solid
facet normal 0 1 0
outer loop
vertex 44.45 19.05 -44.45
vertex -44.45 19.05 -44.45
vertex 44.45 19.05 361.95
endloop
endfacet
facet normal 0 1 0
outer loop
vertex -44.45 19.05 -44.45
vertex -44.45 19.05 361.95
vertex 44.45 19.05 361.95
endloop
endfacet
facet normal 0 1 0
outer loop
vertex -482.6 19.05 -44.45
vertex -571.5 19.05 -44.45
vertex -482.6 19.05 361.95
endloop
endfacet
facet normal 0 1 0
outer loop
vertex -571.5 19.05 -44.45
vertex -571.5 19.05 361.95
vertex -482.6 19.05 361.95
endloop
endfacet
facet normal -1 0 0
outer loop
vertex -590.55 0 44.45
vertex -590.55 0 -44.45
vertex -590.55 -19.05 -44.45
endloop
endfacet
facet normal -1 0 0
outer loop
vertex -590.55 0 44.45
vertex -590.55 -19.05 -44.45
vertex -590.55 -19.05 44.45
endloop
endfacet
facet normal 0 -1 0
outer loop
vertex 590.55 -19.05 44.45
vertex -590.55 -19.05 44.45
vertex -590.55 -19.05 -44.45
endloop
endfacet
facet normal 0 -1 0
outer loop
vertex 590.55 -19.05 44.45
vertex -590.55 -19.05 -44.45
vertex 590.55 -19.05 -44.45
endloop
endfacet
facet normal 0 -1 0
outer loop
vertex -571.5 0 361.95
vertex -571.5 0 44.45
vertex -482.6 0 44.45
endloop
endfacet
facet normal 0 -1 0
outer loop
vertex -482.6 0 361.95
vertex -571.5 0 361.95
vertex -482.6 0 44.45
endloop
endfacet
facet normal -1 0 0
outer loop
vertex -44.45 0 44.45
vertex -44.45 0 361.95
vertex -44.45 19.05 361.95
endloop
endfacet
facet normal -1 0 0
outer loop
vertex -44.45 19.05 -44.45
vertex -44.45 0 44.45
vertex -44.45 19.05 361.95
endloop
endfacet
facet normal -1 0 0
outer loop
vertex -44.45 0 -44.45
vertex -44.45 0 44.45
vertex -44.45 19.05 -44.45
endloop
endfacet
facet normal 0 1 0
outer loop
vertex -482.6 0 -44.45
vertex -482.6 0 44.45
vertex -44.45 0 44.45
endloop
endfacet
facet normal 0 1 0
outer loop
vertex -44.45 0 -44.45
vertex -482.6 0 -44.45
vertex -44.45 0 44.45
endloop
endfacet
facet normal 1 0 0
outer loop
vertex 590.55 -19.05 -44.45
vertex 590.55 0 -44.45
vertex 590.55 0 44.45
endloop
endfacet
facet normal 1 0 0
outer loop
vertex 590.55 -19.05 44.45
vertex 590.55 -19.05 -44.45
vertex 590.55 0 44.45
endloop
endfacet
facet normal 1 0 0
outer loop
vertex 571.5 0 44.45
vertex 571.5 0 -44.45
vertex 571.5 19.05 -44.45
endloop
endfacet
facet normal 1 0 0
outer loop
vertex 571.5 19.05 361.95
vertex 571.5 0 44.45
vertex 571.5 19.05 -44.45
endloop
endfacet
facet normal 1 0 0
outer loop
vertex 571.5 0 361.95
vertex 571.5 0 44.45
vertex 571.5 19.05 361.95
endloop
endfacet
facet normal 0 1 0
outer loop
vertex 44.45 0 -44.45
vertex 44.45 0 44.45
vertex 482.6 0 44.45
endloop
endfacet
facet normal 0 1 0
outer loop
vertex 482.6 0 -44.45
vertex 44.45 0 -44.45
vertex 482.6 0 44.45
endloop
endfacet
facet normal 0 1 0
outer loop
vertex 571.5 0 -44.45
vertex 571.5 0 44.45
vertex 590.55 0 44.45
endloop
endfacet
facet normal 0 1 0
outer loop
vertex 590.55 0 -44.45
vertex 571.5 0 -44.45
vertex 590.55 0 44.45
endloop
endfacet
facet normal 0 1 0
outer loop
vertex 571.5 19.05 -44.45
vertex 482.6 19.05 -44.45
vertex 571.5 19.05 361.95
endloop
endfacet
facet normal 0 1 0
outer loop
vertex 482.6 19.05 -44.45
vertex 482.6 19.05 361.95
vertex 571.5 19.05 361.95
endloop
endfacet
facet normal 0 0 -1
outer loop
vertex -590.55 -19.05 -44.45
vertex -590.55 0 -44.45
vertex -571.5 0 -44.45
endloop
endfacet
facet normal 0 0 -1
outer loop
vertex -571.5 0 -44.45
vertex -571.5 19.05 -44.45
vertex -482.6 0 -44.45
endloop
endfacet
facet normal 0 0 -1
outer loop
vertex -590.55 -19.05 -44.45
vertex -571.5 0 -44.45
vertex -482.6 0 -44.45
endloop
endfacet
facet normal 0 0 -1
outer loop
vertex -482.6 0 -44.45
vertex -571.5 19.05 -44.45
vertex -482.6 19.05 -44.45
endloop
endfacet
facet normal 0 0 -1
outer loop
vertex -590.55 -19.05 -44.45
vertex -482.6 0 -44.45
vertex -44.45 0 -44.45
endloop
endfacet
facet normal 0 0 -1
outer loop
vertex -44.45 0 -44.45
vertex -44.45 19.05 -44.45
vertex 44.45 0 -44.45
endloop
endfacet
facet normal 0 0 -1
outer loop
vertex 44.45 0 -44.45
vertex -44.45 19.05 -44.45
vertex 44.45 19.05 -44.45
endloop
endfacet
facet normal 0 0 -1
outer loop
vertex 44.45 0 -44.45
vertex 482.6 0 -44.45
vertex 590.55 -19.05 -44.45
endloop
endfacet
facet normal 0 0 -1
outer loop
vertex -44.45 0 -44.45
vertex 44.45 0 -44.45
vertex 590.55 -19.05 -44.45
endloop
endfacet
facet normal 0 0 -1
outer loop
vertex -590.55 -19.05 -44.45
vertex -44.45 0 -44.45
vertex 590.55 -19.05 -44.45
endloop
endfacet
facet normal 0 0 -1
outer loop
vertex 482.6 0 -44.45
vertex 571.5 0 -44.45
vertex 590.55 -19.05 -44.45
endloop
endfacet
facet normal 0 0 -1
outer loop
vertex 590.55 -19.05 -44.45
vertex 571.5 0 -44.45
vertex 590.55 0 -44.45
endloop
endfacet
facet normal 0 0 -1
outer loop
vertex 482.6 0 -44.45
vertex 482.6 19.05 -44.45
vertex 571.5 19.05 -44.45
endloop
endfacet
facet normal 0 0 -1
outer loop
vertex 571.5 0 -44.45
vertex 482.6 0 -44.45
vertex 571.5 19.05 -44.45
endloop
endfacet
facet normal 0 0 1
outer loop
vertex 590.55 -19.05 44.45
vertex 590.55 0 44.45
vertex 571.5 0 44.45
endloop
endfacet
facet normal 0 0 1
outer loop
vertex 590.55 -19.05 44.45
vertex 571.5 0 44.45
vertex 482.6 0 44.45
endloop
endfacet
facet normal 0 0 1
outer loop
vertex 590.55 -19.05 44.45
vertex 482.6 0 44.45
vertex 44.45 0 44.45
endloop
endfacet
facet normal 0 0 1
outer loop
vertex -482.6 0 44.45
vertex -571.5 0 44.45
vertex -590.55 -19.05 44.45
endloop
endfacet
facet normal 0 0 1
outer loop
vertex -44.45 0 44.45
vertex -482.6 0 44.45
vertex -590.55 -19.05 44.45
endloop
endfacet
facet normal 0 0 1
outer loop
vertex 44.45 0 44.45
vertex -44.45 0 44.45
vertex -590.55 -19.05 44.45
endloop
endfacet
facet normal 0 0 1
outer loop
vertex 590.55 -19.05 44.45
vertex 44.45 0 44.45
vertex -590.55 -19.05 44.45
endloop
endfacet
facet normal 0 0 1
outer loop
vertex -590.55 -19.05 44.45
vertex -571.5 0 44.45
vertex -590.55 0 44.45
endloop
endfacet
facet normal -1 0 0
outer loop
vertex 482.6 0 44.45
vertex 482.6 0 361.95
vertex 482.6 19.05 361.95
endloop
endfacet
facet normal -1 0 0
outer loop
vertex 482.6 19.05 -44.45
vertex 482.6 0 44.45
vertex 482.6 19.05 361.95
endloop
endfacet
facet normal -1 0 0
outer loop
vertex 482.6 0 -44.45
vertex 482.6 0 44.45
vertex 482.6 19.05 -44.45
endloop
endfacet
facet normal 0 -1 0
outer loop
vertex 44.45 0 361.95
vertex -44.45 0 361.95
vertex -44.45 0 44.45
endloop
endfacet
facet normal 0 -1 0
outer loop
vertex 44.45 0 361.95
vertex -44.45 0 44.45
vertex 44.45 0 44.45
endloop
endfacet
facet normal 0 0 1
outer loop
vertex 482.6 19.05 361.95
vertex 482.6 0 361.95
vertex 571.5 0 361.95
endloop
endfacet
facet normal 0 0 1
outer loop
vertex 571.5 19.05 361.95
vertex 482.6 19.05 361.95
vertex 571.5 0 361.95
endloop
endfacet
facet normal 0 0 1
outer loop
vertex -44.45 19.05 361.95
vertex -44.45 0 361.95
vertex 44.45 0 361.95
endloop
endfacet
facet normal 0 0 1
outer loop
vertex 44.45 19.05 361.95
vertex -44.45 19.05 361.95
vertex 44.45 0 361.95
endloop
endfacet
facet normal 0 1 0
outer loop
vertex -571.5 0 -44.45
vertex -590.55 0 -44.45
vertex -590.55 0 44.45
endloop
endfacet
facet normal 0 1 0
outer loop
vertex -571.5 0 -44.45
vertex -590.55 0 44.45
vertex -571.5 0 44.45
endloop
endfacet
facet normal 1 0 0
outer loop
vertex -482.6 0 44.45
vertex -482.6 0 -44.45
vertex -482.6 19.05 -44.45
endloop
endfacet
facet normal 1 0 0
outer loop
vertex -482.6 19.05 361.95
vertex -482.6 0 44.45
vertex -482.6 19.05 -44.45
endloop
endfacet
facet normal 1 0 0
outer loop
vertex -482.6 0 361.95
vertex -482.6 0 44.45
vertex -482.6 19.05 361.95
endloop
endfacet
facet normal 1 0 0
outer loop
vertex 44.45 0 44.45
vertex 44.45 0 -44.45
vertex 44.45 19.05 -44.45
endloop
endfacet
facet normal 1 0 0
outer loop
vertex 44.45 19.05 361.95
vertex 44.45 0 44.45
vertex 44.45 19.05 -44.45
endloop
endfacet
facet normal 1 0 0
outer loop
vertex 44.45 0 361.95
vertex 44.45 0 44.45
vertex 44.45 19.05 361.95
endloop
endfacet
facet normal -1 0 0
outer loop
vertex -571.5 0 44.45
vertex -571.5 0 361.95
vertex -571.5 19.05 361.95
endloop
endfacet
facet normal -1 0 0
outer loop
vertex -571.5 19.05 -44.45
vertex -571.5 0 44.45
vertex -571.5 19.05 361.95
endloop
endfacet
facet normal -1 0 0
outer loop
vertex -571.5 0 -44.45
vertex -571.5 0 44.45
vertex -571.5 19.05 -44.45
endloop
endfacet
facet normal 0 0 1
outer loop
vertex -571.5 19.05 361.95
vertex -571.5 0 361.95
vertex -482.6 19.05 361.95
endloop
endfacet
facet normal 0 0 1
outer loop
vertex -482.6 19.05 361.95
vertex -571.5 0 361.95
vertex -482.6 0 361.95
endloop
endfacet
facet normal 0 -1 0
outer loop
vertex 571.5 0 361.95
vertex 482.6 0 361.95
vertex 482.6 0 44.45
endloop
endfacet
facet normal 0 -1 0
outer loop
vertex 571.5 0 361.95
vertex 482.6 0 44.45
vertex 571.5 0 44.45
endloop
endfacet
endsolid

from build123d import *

# Parameters (mm, degrees)
F0_W     = 88.9
F0_H     = 88.9
F0_H_2   = 317.5
F1_DEPTH = 19.05
F0_W_2   = 438.15
F0_W_3   = 19.05
F2_DEPTH = 19.05


with BuildPart() as f1:
    # F0 (on Front) → F1 (new body)
    with BuildSketch(Plane.XZ):
        with Locations((-527.05, 0)):
            Rectangle(F0_W, F0_H)
        with Locations((-527.05, 203.2)):
            Rectangle(F0_W, F0_H_2)
    extrude(amount=-F1_DEPTH)



with BuildPart() as f1b:
    # F0 (on Front) → F1, piece 2 (new body)
    with BuildSketch(Plane.XZ):
        Rectangle(F0_W, F0_H)
        with Locations((0, 203.2)):
            Rectangle(F0_W, F0_H_2)
    extrude(amount=-F1_DEPTH)


with BuildPart() as f1c:
    # F0 (on Front) → F1, piece 3 (new body)
    with BuildSketch(Plane.XZ):
        with Locations((527.05, 0)):
            Rectangle(F0_W, F0_H)
        with Locations((527.05, 203.2)):
            Rectangle(F0_W, F0_H_2)
    extrude(amount=-F1_DEPTH)


with BuildPart() as f1_1:
    add(f1.part)

    add(f1b.part)  # F2 merges F1b

    add(f1c.part)  # F2 merges F1c
    # F0 (on Front) → F2 (join)
    with BuildSketch(Plane.XZ):
        with Locations((-263.525, 0)):
            Rectangle(F0_W_2, F0_H)
        with Locations((-527.05, 0)):
            Rectangle(F0_W, F0_H)
        with Locations((-581.025, 0)):
            Rectangle(F0_W_3, F0_H)
        Rectangle(F0_W, F0_H)
        with Locations((263.525, 0)):
            Rectangle(F0_W_2, F0_H)
        with Locations((527.05, 0)):
            Rectangle(F0_W, F0_H)
        with Locations((581.025, 0)):
            Rectangle(F0_W_3, F0_H)
    extrude(amount=F2_DEPTH)


solid = f1_1.part
